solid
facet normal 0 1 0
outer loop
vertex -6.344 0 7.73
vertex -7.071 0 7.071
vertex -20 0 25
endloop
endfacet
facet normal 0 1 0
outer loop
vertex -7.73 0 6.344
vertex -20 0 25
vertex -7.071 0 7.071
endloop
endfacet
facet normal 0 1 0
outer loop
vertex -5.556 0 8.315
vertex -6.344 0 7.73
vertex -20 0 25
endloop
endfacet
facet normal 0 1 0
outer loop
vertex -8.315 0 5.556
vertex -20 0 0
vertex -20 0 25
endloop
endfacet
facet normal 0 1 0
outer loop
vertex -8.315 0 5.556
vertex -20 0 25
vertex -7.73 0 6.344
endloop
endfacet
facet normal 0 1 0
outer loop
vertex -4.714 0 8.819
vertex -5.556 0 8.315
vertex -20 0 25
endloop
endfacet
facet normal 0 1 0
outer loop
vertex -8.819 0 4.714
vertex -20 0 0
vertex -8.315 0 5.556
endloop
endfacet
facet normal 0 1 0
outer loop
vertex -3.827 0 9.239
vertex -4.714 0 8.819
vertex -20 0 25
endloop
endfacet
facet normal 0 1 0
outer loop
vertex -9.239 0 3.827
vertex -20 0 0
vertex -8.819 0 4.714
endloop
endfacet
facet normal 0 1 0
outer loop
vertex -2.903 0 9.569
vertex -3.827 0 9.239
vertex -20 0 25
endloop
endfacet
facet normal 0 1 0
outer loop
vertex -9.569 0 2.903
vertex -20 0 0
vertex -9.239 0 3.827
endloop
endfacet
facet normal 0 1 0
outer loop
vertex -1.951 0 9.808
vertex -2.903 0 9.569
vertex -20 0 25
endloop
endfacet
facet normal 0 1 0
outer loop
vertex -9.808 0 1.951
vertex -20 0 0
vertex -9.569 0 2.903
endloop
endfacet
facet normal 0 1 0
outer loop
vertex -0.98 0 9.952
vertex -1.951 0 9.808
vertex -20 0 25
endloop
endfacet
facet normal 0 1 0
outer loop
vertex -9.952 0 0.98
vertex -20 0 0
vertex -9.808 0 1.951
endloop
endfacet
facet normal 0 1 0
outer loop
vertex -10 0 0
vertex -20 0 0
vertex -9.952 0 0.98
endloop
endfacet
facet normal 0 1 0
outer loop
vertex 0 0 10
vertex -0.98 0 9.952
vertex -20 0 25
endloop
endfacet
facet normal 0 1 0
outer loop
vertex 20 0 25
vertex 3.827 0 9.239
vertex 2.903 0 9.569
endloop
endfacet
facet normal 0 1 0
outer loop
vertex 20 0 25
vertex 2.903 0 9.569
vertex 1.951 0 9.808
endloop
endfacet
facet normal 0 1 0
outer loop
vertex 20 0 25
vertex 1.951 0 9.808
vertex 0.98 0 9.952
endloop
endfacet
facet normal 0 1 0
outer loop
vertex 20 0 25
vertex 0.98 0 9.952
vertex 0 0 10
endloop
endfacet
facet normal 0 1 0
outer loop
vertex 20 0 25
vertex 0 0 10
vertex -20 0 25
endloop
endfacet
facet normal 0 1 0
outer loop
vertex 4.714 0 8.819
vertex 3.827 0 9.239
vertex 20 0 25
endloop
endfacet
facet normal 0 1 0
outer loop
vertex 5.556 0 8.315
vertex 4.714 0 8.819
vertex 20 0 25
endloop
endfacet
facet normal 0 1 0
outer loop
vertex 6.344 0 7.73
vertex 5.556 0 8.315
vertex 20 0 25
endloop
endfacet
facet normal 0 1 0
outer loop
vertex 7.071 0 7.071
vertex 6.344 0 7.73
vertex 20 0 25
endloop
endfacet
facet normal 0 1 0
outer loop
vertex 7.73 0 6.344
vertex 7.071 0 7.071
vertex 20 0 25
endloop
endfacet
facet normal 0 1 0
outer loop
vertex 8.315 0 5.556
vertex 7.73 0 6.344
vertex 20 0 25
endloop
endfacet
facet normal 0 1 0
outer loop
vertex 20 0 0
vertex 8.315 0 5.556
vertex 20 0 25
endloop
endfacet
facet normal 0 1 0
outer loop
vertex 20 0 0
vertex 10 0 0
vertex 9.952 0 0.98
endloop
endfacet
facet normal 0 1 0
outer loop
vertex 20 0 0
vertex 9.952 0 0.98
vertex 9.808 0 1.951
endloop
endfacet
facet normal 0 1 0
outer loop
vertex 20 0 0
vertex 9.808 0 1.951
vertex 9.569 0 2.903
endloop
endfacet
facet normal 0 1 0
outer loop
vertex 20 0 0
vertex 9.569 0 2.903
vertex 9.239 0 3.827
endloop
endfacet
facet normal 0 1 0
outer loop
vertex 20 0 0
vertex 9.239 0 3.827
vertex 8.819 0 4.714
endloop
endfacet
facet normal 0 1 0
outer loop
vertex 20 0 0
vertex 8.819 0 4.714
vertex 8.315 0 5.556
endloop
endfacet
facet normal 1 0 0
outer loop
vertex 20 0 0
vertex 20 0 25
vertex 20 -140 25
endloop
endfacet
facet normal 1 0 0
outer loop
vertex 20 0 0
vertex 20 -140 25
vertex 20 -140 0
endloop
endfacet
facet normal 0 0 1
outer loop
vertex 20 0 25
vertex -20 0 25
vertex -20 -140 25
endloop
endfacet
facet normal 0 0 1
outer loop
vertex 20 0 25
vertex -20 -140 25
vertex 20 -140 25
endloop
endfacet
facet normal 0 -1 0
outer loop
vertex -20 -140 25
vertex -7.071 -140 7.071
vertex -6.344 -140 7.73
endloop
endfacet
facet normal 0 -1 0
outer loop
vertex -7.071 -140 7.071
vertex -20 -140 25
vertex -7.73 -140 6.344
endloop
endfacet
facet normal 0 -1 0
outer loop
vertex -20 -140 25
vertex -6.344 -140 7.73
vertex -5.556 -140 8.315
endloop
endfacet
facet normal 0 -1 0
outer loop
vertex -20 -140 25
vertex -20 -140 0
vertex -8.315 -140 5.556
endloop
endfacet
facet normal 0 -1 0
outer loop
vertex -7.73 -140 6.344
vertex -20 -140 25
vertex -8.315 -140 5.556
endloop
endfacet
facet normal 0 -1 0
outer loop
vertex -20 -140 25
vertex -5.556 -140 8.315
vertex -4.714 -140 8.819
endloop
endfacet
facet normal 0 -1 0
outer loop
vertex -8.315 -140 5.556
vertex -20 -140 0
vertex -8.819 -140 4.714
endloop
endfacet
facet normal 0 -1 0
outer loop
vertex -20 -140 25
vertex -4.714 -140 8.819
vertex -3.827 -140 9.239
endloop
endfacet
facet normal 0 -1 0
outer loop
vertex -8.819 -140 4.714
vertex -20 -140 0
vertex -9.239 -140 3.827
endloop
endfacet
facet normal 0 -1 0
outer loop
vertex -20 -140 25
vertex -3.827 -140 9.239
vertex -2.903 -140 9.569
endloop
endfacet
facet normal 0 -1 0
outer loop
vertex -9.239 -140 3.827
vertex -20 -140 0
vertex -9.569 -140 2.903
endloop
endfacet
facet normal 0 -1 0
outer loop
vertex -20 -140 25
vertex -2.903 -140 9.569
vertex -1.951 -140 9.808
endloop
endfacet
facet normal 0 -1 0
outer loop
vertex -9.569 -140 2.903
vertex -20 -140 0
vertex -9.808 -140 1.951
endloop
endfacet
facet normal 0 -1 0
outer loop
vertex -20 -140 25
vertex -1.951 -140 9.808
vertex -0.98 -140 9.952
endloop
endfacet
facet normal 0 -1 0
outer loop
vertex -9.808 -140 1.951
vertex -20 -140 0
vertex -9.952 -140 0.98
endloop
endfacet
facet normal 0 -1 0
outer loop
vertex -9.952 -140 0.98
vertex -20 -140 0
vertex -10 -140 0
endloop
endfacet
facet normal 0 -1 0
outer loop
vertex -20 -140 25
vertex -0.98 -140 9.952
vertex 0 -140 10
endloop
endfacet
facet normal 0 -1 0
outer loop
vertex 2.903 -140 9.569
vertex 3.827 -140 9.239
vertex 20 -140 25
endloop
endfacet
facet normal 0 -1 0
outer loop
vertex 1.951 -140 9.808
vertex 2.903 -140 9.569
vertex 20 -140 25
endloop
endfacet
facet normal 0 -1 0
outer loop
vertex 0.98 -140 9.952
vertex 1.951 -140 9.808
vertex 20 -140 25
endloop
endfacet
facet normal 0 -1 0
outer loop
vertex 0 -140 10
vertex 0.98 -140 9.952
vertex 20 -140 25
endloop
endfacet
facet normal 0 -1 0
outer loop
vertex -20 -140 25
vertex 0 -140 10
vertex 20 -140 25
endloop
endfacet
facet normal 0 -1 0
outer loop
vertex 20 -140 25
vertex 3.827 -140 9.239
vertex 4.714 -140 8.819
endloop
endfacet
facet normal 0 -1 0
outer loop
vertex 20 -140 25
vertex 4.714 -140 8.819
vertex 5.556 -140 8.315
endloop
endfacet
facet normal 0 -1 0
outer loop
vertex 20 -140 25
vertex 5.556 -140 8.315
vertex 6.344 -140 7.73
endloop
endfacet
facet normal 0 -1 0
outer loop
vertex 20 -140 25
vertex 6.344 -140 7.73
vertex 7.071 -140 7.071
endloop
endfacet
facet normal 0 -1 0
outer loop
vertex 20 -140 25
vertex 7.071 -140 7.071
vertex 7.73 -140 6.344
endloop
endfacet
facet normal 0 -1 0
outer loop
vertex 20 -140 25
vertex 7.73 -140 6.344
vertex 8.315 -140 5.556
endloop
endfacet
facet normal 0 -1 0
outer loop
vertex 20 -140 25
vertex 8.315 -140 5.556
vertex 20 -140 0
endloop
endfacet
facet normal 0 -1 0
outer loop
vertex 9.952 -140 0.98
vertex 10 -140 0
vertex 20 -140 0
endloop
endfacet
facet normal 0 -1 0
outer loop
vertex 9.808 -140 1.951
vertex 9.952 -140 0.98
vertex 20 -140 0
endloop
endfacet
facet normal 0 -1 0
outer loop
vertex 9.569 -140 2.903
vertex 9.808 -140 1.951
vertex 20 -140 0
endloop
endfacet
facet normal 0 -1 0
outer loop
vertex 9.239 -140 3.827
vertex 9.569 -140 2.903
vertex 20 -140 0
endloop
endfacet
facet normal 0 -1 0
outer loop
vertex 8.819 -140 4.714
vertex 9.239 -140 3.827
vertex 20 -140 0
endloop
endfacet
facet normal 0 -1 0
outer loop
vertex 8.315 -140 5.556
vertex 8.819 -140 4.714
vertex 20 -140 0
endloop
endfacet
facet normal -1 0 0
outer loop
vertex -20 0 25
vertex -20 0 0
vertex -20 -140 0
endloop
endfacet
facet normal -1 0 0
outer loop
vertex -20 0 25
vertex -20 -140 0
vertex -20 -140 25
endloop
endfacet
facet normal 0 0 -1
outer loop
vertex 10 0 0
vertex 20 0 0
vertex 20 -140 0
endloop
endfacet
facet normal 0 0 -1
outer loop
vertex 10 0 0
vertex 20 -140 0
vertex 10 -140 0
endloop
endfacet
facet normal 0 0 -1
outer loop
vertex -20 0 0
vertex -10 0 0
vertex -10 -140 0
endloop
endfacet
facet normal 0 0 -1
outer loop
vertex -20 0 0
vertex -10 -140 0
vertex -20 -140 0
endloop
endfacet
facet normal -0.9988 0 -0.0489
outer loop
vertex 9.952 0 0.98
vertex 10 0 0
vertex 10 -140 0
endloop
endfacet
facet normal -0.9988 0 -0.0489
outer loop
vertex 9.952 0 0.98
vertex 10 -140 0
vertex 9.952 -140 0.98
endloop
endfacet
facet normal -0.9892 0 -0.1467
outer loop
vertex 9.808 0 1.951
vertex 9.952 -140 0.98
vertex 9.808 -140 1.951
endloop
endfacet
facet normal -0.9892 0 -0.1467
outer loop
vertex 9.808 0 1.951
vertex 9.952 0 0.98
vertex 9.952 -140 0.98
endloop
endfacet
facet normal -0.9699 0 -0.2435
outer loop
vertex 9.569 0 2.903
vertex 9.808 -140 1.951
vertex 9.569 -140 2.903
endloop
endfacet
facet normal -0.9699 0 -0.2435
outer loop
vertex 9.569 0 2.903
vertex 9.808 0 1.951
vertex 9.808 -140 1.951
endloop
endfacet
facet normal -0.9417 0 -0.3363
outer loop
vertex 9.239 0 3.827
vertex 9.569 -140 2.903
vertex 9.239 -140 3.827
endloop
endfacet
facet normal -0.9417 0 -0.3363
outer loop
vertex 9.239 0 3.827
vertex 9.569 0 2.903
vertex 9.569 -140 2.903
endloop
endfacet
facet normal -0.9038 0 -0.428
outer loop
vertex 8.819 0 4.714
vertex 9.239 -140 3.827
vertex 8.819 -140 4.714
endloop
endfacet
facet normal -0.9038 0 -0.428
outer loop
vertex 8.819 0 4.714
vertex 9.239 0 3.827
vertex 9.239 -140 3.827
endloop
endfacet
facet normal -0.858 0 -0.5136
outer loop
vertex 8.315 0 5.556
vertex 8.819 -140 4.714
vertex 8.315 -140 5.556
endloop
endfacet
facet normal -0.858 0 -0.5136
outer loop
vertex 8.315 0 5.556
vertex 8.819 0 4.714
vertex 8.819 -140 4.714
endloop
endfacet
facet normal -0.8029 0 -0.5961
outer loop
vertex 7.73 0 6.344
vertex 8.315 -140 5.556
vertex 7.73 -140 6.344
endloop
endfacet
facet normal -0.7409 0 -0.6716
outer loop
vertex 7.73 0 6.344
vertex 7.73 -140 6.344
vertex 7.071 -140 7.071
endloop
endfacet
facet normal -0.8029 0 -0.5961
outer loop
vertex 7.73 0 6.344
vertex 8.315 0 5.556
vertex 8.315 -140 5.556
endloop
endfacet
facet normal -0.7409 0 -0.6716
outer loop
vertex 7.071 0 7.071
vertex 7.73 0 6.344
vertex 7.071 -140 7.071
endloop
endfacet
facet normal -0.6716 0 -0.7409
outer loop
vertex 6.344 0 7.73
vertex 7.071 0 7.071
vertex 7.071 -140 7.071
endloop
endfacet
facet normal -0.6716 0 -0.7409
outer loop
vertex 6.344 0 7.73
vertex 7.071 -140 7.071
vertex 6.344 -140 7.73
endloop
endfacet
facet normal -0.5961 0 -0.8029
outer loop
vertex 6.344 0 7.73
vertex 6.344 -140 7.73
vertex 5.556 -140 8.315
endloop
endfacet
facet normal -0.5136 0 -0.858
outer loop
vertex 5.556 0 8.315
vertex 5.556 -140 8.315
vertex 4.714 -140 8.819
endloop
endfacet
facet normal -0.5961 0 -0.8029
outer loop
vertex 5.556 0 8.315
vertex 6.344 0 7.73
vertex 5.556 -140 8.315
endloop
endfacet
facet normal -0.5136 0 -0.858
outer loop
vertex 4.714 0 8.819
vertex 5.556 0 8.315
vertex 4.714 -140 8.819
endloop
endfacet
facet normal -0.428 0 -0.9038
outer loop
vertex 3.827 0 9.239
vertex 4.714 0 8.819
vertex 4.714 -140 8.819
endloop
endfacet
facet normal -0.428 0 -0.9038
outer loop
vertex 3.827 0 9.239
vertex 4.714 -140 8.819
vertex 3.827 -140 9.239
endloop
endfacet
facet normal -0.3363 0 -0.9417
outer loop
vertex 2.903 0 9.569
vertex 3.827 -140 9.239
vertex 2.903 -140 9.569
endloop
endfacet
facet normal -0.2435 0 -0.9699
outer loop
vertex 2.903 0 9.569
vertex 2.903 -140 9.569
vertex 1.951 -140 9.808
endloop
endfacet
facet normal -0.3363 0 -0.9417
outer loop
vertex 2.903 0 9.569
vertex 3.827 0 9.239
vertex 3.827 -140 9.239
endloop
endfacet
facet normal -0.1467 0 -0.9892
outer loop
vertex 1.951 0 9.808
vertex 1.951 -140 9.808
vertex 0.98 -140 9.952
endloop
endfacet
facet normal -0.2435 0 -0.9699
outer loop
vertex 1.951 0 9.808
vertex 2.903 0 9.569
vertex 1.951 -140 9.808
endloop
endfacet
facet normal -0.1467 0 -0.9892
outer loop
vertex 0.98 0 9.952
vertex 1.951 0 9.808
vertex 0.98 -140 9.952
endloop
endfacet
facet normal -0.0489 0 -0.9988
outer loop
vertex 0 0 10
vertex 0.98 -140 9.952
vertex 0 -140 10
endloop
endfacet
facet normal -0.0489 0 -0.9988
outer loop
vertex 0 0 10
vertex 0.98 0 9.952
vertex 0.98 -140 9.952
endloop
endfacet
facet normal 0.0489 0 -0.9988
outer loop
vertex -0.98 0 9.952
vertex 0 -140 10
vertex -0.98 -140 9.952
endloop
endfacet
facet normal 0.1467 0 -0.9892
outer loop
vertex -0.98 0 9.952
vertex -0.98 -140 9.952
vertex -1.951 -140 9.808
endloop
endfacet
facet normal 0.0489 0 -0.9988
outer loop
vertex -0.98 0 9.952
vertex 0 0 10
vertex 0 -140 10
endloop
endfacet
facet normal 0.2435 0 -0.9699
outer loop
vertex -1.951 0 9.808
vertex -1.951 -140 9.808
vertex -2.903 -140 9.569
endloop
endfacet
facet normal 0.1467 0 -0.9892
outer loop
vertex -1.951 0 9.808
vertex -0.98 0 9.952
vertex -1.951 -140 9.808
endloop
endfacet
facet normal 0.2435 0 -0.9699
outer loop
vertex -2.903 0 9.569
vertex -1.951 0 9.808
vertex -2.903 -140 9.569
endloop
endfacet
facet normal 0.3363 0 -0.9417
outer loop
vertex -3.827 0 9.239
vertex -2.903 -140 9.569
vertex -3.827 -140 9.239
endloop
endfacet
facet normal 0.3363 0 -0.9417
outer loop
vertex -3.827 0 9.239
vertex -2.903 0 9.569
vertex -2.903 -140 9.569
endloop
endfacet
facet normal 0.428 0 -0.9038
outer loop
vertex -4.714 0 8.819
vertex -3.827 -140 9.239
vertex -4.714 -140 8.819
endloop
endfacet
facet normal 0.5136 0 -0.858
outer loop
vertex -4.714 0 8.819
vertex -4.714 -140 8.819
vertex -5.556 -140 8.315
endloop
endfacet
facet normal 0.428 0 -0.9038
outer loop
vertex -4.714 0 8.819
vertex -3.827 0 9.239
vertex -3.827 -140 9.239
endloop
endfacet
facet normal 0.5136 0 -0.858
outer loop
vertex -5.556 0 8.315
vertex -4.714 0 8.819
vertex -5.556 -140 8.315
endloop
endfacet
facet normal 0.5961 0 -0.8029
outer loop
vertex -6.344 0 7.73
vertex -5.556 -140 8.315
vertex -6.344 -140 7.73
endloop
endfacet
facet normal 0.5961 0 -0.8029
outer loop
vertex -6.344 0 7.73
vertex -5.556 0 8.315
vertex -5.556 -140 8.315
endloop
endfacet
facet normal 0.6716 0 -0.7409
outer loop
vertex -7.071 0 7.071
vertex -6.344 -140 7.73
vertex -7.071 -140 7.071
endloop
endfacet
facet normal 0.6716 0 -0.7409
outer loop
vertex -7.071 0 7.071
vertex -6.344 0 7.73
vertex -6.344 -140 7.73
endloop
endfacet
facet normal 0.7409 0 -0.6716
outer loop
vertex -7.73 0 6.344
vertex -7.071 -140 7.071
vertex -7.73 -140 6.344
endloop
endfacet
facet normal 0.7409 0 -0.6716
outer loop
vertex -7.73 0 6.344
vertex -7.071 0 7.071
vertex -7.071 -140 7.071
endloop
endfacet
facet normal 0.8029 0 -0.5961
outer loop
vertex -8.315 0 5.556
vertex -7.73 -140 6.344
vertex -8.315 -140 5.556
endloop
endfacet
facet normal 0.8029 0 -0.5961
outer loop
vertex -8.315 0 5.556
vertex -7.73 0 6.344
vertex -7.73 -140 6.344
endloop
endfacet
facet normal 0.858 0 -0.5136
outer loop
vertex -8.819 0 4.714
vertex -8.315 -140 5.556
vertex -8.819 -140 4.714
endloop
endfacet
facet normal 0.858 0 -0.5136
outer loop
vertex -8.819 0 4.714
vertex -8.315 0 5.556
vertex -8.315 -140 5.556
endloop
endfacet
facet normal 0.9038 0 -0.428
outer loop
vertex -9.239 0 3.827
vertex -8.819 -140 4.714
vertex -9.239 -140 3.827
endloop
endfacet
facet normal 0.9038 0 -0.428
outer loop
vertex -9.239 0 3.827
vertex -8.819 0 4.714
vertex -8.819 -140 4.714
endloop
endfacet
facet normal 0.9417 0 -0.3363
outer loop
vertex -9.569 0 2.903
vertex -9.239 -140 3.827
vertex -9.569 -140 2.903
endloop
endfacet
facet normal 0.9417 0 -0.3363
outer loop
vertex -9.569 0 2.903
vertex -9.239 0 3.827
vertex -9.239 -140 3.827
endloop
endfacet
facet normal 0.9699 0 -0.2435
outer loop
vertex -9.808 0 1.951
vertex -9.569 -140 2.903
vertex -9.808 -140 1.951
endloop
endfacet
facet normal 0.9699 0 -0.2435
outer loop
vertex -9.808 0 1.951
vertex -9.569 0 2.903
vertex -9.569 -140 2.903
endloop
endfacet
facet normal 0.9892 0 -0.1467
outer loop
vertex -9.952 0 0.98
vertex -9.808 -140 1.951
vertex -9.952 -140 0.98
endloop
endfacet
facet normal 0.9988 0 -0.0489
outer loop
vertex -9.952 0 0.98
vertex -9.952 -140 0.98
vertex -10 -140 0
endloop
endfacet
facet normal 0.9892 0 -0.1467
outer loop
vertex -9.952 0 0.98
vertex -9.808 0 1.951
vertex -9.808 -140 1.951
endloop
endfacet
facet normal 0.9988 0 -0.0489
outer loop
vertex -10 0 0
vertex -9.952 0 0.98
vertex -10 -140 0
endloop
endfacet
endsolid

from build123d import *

# Parameters (mm, degrees)
BOSS_EXTRUDE1_DEPTH = 140


with BuildPart() as part:
    # Sketch4 → Boss-Extrude1 (new body)
    with BuildSketch(Plane(origin=(0, 0, 0), x_dir=(1, 0, 0), z_dir=(0, 1, 0))):
        with BuildLine():
            ThreePointArc((10, 0), (0, -10), (-10, 0))
            Line((-10, 0), (-20, 0))
            Line((-20, 0), (-20, -25))
            Line((-20, -25), (20, -25))
            Line((20, -25), (20, 0))
            Line((20, 0), (10, 0))
        make_face()
    extrude(amount=-BOSS_EXTRUDE1_DEPTH)


solid = part.part
